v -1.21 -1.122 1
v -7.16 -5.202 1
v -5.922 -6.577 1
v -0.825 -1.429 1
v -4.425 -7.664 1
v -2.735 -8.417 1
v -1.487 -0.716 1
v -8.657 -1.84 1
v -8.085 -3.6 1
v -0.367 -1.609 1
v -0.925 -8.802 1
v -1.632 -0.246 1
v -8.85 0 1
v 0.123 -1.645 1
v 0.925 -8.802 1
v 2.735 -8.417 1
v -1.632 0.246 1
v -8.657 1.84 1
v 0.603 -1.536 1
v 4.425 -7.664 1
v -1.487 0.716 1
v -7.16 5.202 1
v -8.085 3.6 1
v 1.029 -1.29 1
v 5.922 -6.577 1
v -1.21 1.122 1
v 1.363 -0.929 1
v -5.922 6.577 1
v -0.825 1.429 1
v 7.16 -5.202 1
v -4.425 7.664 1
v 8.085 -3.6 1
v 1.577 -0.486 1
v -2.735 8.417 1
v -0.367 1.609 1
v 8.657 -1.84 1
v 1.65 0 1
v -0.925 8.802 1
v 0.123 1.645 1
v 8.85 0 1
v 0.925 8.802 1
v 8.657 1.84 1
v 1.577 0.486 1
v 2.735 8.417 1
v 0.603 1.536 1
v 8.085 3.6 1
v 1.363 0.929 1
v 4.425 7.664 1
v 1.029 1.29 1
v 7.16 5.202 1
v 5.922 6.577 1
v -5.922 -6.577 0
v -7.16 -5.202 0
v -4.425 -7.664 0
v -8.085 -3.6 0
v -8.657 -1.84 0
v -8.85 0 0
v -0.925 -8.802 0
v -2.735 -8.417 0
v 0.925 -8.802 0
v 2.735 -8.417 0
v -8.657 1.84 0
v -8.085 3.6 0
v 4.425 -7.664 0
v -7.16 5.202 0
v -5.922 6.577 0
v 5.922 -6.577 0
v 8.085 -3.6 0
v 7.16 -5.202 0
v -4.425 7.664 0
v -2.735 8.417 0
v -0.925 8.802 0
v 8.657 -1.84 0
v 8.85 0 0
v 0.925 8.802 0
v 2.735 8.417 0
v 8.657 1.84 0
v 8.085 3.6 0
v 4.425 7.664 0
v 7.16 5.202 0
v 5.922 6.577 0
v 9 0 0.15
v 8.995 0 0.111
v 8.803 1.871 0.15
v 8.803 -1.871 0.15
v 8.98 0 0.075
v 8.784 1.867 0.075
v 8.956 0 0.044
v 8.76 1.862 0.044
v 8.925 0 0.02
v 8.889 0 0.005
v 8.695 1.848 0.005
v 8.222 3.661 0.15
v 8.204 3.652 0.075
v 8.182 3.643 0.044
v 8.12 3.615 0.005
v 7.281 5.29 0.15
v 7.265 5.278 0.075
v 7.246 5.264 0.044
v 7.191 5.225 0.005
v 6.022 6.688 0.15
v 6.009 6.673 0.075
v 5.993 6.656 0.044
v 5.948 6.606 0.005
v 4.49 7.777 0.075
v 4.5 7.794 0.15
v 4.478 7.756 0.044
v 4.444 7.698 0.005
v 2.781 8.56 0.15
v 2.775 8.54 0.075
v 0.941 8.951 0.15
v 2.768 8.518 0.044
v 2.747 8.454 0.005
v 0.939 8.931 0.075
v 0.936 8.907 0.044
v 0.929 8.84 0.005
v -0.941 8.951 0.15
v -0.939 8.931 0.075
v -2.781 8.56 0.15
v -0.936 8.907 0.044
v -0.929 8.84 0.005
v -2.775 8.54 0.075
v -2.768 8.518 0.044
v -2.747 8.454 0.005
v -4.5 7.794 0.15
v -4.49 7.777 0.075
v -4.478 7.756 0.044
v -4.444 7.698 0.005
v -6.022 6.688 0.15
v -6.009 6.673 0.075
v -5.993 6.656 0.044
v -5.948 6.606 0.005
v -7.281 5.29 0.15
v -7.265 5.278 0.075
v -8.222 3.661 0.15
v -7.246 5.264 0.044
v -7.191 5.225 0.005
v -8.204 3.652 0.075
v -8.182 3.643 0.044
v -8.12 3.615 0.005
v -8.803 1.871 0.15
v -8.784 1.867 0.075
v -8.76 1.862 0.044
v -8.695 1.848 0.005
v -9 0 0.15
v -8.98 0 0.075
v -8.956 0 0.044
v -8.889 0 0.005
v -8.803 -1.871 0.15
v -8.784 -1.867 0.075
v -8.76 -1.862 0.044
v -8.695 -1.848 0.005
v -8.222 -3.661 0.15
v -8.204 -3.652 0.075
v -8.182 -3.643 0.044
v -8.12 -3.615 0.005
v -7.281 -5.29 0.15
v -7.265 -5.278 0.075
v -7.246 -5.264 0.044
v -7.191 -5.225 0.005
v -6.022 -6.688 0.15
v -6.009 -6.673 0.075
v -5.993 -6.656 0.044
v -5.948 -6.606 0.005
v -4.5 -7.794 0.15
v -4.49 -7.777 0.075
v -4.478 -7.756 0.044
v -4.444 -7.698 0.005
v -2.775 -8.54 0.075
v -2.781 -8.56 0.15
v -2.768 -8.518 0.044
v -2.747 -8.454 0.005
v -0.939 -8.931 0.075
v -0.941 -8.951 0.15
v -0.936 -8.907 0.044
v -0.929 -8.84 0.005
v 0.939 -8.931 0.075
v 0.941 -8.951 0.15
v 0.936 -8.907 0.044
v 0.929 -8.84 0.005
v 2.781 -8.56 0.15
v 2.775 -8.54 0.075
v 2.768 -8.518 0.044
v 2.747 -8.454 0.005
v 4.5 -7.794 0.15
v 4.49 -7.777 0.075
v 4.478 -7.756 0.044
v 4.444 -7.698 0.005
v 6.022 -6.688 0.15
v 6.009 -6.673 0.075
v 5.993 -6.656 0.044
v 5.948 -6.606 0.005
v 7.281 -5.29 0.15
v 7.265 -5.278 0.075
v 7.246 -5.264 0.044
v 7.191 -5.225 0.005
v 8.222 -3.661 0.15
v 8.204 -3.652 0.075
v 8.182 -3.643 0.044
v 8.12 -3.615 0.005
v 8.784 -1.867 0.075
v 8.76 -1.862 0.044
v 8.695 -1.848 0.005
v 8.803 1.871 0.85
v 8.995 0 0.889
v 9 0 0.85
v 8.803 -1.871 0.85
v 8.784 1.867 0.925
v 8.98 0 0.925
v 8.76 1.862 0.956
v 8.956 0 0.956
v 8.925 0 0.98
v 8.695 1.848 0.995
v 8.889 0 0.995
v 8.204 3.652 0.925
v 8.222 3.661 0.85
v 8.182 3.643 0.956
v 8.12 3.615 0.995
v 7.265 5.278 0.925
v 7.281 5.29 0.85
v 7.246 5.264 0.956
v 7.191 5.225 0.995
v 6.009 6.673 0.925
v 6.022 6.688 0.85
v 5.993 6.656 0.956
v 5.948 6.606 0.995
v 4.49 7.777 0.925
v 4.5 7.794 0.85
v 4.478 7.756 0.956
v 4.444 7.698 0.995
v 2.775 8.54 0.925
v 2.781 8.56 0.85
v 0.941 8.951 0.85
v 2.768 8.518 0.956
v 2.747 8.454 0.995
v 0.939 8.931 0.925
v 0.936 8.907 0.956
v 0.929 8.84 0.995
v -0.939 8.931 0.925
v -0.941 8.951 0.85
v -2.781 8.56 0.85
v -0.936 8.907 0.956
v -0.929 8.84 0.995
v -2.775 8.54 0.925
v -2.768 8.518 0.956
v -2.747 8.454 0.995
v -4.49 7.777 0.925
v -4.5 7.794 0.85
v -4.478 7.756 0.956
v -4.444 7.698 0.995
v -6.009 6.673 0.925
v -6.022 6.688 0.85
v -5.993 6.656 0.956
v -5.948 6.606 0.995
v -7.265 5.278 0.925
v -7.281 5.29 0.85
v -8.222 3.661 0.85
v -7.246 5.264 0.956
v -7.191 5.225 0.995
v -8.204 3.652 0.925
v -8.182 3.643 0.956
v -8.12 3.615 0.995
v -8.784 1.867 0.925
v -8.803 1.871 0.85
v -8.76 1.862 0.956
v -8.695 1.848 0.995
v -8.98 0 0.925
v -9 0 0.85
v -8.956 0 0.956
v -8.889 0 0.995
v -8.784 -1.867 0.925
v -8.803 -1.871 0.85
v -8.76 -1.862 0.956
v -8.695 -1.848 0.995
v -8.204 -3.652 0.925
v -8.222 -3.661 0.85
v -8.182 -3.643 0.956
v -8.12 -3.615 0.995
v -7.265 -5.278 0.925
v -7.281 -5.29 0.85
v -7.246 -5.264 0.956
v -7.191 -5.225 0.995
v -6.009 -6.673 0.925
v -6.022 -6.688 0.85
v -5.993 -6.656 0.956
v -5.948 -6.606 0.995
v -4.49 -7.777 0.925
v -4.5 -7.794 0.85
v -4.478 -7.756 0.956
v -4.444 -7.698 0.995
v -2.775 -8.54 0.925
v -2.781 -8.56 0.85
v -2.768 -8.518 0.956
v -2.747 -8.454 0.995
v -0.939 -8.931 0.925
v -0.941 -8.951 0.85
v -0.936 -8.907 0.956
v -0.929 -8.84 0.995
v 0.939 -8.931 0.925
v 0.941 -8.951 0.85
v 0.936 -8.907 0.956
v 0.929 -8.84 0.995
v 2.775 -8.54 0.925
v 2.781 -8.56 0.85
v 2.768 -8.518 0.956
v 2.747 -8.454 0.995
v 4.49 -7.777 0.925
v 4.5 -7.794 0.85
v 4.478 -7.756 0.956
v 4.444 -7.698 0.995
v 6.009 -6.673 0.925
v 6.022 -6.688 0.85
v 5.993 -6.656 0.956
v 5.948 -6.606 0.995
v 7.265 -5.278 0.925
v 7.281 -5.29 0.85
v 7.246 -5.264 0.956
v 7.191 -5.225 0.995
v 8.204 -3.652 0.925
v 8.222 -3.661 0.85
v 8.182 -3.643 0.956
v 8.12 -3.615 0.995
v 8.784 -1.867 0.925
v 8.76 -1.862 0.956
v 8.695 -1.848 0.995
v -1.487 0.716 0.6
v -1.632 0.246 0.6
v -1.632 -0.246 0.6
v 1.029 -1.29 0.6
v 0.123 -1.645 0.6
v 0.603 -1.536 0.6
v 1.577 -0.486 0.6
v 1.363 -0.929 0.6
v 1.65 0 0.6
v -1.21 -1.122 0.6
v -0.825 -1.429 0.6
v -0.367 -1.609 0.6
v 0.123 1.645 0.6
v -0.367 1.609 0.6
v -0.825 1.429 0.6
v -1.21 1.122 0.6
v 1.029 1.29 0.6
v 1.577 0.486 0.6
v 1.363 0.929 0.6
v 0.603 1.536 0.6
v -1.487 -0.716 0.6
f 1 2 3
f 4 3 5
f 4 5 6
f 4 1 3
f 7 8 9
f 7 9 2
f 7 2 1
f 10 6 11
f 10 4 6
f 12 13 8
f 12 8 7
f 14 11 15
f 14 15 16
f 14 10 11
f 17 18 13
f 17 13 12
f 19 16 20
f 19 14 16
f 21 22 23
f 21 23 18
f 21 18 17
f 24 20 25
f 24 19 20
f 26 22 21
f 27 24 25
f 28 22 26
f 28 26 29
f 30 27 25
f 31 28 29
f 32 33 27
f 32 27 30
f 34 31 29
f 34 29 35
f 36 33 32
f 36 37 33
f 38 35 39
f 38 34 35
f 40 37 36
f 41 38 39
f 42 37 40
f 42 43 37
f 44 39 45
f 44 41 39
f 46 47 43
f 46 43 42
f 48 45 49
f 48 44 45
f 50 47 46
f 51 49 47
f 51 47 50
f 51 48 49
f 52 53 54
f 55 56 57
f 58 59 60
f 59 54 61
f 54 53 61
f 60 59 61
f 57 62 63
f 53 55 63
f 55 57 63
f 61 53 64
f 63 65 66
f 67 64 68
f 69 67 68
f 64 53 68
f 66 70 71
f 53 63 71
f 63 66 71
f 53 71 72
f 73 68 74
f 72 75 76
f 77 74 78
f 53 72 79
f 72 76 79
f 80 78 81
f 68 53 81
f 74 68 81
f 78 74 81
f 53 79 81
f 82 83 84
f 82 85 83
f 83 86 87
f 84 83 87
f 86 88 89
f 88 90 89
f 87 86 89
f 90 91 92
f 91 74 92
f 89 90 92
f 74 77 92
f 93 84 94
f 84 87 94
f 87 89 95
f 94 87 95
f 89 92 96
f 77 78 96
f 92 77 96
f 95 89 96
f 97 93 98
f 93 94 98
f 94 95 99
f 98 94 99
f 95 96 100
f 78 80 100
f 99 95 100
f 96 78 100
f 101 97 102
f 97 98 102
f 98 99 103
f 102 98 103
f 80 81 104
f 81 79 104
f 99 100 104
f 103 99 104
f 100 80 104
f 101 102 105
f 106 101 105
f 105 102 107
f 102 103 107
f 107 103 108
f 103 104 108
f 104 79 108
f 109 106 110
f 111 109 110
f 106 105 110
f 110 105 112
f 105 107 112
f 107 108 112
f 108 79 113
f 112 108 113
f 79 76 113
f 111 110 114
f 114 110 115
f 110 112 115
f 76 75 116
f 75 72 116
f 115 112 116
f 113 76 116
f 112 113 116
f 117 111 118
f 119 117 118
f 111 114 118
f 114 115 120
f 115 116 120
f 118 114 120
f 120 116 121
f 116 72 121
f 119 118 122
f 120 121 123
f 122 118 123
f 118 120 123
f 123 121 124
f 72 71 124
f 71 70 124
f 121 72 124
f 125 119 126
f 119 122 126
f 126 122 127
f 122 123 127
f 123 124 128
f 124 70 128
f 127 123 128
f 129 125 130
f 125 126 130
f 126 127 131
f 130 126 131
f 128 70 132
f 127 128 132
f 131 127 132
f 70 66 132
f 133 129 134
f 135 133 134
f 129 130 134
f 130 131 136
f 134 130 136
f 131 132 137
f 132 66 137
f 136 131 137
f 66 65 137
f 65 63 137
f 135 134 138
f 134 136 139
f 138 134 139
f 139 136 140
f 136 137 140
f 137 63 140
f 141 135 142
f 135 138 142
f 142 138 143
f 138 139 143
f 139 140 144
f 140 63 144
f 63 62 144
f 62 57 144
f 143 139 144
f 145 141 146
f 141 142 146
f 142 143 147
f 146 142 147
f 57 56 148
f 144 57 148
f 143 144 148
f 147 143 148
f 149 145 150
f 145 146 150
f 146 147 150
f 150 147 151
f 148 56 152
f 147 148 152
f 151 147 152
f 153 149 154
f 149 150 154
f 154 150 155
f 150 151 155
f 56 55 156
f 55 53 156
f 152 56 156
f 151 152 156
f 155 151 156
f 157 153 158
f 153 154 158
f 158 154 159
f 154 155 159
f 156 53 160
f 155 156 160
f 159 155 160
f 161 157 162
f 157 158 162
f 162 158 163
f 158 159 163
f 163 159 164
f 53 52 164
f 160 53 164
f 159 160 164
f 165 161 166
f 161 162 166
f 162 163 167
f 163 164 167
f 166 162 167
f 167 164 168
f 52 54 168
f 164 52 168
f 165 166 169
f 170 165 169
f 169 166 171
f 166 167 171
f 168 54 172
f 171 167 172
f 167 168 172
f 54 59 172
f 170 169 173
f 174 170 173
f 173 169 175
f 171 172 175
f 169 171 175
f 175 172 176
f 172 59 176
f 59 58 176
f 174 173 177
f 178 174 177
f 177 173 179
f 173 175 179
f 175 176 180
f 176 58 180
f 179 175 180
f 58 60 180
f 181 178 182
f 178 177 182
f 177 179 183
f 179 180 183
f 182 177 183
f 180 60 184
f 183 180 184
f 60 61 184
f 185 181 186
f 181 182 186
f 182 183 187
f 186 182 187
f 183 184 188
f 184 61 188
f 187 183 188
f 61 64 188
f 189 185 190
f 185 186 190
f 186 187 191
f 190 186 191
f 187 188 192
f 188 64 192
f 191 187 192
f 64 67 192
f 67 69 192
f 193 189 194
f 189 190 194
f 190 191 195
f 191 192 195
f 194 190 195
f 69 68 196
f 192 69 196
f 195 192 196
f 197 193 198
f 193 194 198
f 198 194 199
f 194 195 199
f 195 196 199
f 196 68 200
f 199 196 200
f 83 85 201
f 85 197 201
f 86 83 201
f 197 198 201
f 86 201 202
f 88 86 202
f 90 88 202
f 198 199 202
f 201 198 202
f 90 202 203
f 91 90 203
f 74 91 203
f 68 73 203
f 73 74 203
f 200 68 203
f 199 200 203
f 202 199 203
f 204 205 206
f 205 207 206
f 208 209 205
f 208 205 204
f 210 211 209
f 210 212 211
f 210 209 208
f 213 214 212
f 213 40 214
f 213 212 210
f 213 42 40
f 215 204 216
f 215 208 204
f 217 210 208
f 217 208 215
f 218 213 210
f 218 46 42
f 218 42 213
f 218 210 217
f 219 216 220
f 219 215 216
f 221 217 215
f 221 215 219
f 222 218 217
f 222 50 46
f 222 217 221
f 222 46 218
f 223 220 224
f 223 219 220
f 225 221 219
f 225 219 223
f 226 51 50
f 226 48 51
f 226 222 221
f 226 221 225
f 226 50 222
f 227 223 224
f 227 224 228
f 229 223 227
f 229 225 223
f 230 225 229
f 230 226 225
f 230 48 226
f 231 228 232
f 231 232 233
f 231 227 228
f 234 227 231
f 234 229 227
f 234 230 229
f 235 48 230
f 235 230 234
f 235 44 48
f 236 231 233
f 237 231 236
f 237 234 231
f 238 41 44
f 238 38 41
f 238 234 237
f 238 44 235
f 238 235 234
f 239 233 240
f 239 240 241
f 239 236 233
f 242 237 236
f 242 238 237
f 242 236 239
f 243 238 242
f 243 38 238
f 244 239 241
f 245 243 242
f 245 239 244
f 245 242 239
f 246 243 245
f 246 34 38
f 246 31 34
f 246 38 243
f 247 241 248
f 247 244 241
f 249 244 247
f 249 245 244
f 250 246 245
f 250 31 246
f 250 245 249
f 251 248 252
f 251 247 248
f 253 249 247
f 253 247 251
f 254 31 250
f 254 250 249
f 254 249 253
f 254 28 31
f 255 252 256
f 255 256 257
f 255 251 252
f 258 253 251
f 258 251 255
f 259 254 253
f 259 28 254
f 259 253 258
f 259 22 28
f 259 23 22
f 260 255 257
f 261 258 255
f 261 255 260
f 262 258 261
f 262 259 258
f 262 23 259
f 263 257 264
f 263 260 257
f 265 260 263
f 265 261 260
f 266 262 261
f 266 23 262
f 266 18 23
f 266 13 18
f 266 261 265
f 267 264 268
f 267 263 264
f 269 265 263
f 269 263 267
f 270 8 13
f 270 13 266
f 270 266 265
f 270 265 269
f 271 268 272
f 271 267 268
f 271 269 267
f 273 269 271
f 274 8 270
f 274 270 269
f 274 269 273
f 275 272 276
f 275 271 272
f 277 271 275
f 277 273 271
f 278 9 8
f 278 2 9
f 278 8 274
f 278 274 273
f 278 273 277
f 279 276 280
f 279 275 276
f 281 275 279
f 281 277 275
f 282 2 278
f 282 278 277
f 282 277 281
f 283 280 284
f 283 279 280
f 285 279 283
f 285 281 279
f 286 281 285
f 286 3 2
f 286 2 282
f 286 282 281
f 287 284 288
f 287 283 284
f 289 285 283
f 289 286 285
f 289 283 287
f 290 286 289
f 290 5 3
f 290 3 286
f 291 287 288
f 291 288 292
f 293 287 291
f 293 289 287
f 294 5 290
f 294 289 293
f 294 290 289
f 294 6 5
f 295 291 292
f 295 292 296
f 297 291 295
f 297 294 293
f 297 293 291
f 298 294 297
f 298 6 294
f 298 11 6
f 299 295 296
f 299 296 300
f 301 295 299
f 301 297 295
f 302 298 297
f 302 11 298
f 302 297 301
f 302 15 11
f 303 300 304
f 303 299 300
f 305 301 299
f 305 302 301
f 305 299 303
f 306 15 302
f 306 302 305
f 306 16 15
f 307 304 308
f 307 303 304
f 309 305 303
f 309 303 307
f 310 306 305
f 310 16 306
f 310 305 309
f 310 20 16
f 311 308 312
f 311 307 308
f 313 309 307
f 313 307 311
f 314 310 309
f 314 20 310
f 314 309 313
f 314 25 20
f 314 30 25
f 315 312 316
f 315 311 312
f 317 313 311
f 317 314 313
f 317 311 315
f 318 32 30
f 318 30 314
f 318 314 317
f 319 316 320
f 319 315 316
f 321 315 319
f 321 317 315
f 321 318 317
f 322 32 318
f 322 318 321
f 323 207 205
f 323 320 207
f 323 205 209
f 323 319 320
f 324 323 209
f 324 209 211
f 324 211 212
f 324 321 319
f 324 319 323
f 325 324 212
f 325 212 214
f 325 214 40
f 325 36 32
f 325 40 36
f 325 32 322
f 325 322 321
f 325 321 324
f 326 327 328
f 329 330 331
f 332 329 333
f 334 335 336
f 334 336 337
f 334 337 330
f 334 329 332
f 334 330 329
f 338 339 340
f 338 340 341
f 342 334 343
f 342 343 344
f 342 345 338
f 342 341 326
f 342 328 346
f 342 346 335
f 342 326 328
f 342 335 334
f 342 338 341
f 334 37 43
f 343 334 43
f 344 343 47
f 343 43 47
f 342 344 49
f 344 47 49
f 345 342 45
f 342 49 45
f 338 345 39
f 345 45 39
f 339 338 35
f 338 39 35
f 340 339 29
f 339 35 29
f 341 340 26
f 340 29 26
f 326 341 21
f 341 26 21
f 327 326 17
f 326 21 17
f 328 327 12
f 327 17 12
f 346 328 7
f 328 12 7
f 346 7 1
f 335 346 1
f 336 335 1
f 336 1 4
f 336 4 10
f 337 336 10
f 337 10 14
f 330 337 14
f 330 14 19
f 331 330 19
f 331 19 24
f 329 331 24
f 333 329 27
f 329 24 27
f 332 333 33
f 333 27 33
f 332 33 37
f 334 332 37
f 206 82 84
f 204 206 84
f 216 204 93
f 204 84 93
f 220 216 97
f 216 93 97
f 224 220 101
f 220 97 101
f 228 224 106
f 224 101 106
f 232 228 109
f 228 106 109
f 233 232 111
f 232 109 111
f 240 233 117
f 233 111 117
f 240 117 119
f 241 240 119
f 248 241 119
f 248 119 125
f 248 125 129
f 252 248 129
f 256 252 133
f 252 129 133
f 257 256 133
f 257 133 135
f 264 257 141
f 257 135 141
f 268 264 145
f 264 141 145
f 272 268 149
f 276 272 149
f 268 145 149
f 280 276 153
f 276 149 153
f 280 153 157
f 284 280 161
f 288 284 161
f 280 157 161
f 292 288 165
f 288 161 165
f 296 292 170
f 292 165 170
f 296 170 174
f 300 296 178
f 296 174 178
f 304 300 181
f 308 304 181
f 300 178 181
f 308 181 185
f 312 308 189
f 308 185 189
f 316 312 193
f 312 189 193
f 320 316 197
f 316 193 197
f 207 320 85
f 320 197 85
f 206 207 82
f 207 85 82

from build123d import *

# Parameters (mm, degrees)
F0_R     = 9
F1_DEPTH = 1
F2_R     = 0.15
F3_R     = 1.65
F4_DEPTH = 0.4


# Not quite as in the source:
# - a feature names something its author has since deleted; it is built from what else it names


with BuildPart() as f1:
    # F0 (on Top) → F1 (new body)
    with BuildSketch(Plane.XY):
        Circle(F0_R)
    extrude(amount=F1_DEPTH)

    # F2
    f2_edges = [f1.edges().sort_by_distance(p)[0] for p in [
        (-9, 0, 1),
        (-9, 0, 0),
    ]]
    fillet(f2_edges, radius=F2_R)

    # F3 (on face) → F4 (cut)
    with BuildSketch(Plane.XY.offset(1)):
        Circle(F3_R)
    extrude(amount=-F4_DEPTH, mode=Mode.SUBTRACT)


solid = f1.part
